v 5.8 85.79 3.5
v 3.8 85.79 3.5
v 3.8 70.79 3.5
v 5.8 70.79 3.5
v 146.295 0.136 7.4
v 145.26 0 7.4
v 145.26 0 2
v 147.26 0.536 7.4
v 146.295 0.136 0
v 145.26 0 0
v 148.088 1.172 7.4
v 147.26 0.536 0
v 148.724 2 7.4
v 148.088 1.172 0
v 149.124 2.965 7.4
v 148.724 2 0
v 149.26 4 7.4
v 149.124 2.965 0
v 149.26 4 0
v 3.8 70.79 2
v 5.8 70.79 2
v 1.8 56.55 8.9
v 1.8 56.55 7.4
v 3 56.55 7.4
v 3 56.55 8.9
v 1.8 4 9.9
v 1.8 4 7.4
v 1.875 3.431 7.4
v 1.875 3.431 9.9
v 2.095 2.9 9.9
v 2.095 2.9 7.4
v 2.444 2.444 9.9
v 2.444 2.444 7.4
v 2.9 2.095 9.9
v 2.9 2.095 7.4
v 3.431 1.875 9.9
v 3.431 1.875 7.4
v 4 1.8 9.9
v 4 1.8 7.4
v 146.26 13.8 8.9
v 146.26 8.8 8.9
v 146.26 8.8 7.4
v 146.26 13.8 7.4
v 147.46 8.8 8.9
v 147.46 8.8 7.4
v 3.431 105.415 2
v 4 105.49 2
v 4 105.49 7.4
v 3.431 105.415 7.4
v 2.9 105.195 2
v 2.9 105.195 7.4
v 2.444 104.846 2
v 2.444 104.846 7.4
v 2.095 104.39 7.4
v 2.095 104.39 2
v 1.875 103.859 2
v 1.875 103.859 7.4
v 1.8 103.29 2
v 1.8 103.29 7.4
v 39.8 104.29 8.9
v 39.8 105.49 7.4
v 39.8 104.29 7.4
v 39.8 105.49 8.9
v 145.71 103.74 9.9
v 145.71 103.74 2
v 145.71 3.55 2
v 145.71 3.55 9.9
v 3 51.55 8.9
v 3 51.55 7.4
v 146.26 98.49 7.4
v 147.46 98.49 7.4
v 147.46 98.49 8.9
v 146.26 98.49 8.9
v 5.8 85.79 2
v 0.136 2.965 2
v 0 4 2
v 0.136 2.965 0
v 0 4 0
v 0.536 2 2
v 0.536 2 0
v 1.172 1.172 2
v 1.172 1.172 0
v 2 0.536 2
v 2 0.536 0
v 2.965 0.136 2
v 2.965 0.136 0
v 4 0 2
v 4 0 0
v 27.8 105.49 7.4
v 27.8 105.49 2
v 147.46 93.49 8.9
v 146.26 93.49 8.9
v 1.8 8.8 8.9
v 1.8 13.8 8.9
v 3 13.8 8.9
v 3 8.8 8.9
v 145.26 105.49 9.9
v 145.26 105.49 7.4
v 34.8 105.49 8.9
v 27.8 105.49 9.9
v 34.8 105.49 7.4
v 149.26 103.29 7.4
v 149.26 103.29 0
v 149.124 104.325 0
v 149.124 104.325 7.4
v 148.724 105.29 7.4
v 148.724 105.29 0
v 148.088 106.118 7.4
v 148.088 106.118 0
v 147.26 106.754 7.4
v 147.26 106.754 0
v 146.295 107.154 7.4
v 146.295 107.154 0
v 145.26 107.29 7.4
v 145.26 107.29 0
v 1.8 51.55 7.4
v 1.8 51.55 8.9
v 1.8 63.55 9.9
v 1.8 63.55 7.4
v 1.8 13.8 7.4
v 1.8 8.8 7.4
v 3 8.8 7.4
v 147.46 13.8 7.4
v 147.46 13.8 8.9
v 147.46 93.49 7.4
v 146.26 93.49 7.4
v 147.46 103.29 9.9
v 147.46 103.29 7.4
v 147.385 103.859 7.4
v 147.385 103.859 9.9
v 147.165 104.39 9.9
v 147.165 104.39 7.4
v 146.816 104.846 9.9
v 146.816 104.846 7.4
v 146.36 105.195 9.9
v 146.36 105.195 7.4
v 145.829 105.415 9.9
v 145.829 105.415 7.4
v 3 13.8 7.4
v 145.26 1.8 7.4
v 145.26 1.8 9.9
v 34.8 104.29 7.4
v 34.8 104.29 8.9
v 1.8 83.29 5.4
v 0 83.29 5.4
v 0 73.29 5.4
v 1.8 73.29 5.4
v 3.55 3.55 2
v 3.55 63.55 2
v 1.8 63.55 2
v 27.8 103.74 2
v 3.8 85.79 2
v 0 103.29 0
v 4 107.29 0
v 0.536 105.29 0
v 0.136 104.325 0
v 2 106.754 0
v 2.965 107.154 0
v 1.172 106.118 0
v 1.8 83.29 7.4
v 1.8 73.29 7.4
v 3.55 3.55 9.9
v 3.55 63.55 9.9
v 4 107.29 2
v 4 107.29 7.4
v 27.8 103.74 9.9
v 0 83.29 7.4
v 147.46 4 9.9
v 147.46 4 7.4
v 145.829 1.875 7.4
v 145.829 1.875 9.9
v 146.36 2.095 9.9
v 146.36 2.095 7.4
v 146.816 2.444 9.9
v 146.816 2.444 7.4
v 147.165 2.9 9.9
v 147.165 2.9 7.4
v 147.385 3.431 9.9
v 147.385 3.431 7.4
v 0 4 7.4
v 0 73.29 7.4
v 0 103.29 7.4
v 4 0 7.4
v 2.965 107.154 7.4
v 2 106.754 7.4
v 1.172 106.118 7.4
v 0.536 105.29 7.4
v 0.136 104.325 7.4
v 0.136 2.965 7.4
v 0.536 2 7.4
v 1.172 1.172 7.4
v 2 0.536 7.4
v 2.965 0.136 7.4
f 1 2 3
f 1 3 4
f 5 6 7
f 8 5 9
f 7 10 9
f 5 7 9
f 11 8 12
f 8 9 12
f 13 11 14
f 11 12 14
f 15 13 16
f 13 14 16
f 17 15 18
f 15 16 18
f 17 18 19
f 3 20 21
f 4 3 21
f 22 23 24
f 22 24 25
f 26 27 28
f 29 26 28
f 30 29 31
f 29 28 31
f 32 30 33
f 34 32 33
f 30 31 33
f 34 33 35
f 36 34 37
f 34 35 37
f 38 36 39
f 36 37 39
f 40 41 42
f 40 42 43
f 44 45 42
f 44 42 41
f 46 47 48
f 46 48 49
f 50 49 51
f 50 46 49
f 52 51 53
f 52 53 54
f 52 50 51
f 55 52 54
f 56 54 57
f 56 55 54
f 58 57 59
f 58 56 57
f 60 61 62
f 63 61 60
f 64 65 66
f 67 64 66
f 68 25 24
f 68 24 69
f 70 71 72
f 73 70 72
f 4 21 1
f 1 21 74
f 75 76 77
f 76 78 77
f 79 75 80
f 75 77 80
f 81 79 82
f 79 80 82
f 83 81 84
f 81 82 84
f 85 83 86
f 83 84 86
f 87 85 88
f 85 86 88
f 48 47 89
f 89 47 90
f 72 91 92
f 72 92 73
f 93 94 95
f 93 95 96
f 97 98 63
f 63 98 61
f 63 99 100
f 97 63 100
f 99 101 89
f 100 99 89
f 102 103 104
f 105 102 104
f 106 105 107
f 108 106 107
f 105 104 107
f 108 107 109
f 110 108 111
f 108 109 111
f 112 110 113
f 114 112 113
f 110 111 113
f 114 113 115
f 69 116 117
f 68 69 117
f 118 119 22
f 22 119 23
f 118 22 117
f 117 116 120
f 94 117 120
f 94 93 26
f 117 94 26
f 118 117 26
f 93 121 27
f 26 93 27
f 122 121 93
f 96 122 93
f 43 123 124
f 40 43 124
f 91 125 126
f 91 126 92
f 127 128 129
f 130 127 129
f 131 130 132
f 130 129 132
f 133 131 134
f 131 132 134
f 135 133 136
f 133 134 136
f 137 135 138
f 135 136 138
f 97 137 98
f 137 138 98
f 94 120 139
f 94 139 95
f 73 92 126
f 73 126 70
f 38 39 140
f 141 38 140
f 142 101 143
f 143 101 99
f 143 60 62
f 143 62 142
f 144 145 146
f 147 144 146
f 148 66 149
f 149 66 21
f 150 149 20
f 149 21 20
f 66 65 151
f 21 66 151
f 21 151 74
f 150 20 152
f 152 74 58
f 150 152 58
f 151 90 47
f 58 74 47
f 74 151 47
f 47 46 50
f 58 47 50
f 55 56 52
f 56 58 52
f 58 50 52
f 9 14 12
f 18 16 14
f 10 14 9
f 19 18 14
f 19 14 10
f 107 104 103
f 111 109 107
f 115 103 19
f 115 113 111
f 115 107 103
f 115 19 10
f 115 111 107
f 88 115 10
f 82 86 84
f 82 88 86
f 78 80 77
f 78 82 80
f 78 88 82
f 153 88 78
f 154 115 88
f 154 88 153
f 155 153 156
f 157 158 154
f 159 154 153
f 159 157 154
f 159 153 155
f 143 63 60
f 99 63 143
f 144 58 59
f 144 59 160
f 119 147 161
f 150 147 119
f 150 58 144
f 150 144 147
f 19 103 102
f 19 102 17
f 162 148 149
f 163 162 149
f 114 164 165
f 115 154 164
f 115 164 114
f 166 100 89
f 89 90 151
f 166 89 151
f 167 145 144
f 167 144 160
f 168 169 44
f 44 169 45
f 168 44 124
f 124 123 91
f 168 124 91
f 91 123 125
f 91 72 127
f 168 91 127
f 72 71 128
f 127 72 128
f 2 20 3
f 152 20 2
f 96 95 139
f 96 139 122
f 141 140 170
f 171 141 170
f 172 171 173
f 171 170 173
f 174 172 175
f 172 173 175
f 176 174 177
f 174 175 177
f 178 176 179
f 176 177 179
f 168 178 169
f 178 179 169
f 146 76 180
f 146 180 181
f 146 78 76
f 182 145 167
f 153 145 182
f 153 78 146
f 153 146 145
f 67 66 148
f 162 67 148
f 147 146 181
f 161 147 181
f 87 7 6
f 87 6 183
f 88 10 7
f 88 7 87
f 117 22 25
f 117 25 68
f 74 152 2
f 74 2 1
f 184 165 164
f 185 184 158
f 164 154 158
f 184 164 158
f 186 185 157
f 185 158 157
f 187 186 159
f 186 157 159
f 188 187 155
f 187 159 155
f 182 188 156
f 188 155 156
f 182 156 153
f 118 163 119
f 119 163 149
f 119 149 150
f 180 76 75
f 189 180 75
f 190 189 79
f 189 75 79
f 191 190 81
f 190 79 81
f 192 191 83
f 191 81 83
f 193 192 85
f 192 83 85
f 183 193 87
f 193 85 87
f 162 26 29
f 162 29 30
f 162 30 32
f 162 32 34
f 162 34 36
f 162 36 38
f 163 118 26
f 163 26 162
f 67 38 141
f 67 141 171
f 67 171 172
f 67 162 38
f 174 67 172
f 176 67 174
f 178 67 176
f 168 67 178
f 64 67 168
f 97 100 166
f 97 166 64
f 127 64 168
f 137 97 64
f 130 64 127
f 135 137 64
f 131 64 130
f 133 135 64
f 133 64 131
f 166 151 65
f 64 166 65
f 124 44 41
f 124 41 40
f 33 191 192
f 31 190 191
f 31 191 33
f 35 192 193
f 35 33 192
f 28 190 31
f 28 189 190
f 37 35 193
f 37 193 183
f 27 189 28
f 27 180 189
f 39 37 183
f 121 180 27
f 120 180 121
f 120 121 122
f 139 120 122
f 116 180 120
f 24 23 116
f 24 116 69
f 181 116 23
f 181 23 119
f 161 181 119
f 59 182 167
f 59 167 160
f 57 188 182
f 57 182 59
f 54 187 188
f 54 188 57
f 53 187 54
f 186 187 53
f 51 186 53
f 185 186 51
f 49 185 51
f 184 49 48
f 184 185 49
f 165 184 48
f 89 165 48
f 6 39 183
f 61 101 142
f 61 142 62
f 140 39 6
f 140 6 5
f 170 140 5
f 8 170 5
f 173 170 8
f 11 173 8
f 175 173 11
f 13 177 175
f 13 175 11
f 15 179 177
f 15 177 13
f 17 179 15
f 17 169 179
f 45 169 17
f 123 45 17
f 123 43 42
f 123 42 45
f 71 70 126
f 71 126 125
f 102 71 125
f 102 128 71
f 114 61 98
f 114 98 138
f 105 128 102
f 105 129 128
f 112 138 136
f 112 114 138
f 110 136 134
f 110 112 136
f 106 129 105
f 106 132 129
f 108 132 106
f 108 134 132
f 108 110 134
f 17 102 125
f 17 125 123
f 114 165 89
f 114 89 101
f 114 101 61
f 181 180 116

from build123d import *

# Parameters (mm, degrees)
PAD_DEPTH       = 2
PAD001_DEPTH    = 5.4
PAD002_DEPTH    = 7.9
SKETCH003_W     = 10
SKETCH003_H     = 2
POCKET_DEPTH    = 1.8
SKETCH004_W     = 2
SKETCH004_H     = 15
PAD003_DEPTH    = 1.5
SKETCH005_W     = 5
SKETCH005_H     = 1.5
POCKET001_DEPTH = 1.2
SKETCH006_W     = 5
SKETCH006_H     = 1.5
POCKET002_DEPTH = 1.2
SKETCH007_W     = 5
SKETCH007_H     = 1.5
POCKET003_DEPTH = 1.2


with BuildPart() as part:
    # Sketch → Pad (new body)
    with BuildSketch(Plane.XY):
        with BuildLine():
            Line((149.259997, 103.29), (149.259997, 4))
            ThreePointArc((145.259999, 0), (148.088425, 1.171573), (149.259997, 4))
            Line((3.999999, 0), (145.259999, 0))
            ThreePointArc((0, 4), (1.171572, 1.171573), (3.999999, 0))
            Line((0, 103.29), (0, 4))
            ThreePointArc((3.999997, 107.29), (1.171572, 106.118426), (0, 103.29))
            Line((3.999997, 107.29), (145.259997, 107.29))
            ThreePointArc((149.259997, 103.29), (148.088425, 106.118427), (145.259997, 107.29))
        make_face()
    extrude(amount=PAD_DEPTH)

    # Sketch001 (on Face10 of Pad) → Pad001 (join)
    with BuildSketch(Plane.XY.offset(2)):
        with BuildLine():
            ThreePointArc((149.259997, 103.29), (148.088425, 106.118427), (145.259997, 107.29))
            Line((3.999998, 107.29), (145.259997, 107.29))
            ThreePointArc((3.999998, 107.29), (1.171572, 106.118426), (0, 103.29))
            Line((0, 3.999998), (0, 103.29))
            ThreePointArc((0, 3.999998), (1.171573, 1.171573), (3.999999, 0))
            Line((145.259996, 0), (3.999999, 0))
            ThreePointArc((145.259996, 0), (148.088424, 1.171572), (149.259997, 4))
            Line((149.259997, 103.29), (149.259997, 4))
        make_face()
        with BuildLine():
            Line((3.999998, 105.49), (145.259995, 105.49))
            ThreePointArc((147.459997, 103.290002), (146.815631, 104.845636), (145.259995, 105.49))
            Line((147.459997, 4.000002), (147.459997, 103.290002))
            ThreePointArc((145.26, 1.8), (146.815634, 2.444367), (147.459997, 4.000002))
            Line((4.000003, 1.8), (145.26, 1.8))
            ThreePointArc((1.8, 3.999996), (2.444368, 2.444363), (4.000003, 1.8))
            Line((1.8, 103.289998), (1.8, 3.999996))
            ThreePointArc((3.999998, 105.49), (2.444364, 104.845634), (1.8, 103.289998))
        make_face(mode=Mode.SUBTRACT)
    extrude(amount=PAD001_DEPTH)

    # Sketch002 (on Face10 of Pad001) → Pad002 (join)
    with BuildSketch(Plane.XY.offset(2)):
        with BuildLine():
            Line((145.709997, 103.74), (145.709997, 3.55))
            Line((145.709997, 3.55), (3.55, 3.55))
            Line((3.55, 3.55), (3.55, 63.55))
            Line((3.55, 63.55), (1.8, 63.55))
            Line((1.8, 63.55), (1.8, 3.999996))
            ThreePointArc((1.8, 3.999996), (2.444368, 2.444363), (4.000003, 1.8))
            Line((4.000003, 1.8), (145.26, 1.8))
            ThreePointArc((145.26, 1.8), (146.815634, 2.444367), (147.459997, 4.000003))
            Line((147.459997, 4.000003), (147.459997, 103.290002))
            ThreePointArc((147.459997, 103.290002), (146.815631, 104.845636), (145.259995, 105.49))
            Line((145.259995, 105.49), (27.8, 105.49))
            Line((27.8, 105.49), (27.8, 103.74))
            Line((27.8, 103.74), (145.709997, 103.74))
        make_face()
    extrude(amount=PAD002_DEPTH)

    # Sketch003 (on Face5 of Pad002) → Pocket (cut)
    with BuildSketch(Plane(origin=(0, 0, 0), x_dir=(0, -1, 0), z_dir=(-1, 0, 0))):
        with Locations((-78.29, 6.4)):
            Rectangle(SKETCH003_W, SKETCH003_H)
    extrude(amount=-POCKET_DEPTH, mode=Mode.SUBTRACT)

    # Sketch004 (on Face24 of Pocket) → Pad003 (join)
    with BuildSketch(Plane.XY.offset(2)):
        with Locations((4.8, 78.29)):
            Rectangle(SKETCH004_W, SKETCH004_H)
    extrude(amount=PAD003_DEPTH)

    # Sketch005 (on Face13 of Pad003) → Pocket001 (cut)
    with BuildSketch(Plane.YZ.offset(147.459997)):
        with Locations((11.3, 8.15)):
            Rectangle(SKETCH005_W, SKETCH005_H)
        with Locations((95.99, 8.15)):
            Rectangle(SKETCH005_W, SKETCH005_H)
    extrude(amount=-POCKET001_DEPTH, mode=Mode.SUBTRACT)

    # Sketch006 (on Face18 of Pocket001) → Pocket002 (cut)
    with BuildSketch(Plane(origin=(1.8, 0, 0), x_dir=(0, -1, 0), z_dir=(-1, 0, 0))):
        with Locations((-54.05, 8.15)):
            Rectangle(SKETCH006_W, SKETCH006_H)
        with Locations((-11.3, 8.15)):
            Rectangle(SKETCH006_W, SKETCH006_H)
    extrude(amount=-POCKET002_DEPTH, mode=Mode.SUBTRACT)

    # Sketch007 (on Face21 of Pocket002) → Pocket003 (cut)
    with BuildSketch(Plane(origin=(0, 105.49, 0), x_dir=(-1, 0, 0), z_dir=(0, 1, 0))):
        with Locations((-37.3, 8.15)):
            Rectangle(SKETCH007_W, SKETCH007_H)
    extrude(amount=-POCKET003_DEPTH, mode=Mode.SUBTRACT)


solid = part.part
